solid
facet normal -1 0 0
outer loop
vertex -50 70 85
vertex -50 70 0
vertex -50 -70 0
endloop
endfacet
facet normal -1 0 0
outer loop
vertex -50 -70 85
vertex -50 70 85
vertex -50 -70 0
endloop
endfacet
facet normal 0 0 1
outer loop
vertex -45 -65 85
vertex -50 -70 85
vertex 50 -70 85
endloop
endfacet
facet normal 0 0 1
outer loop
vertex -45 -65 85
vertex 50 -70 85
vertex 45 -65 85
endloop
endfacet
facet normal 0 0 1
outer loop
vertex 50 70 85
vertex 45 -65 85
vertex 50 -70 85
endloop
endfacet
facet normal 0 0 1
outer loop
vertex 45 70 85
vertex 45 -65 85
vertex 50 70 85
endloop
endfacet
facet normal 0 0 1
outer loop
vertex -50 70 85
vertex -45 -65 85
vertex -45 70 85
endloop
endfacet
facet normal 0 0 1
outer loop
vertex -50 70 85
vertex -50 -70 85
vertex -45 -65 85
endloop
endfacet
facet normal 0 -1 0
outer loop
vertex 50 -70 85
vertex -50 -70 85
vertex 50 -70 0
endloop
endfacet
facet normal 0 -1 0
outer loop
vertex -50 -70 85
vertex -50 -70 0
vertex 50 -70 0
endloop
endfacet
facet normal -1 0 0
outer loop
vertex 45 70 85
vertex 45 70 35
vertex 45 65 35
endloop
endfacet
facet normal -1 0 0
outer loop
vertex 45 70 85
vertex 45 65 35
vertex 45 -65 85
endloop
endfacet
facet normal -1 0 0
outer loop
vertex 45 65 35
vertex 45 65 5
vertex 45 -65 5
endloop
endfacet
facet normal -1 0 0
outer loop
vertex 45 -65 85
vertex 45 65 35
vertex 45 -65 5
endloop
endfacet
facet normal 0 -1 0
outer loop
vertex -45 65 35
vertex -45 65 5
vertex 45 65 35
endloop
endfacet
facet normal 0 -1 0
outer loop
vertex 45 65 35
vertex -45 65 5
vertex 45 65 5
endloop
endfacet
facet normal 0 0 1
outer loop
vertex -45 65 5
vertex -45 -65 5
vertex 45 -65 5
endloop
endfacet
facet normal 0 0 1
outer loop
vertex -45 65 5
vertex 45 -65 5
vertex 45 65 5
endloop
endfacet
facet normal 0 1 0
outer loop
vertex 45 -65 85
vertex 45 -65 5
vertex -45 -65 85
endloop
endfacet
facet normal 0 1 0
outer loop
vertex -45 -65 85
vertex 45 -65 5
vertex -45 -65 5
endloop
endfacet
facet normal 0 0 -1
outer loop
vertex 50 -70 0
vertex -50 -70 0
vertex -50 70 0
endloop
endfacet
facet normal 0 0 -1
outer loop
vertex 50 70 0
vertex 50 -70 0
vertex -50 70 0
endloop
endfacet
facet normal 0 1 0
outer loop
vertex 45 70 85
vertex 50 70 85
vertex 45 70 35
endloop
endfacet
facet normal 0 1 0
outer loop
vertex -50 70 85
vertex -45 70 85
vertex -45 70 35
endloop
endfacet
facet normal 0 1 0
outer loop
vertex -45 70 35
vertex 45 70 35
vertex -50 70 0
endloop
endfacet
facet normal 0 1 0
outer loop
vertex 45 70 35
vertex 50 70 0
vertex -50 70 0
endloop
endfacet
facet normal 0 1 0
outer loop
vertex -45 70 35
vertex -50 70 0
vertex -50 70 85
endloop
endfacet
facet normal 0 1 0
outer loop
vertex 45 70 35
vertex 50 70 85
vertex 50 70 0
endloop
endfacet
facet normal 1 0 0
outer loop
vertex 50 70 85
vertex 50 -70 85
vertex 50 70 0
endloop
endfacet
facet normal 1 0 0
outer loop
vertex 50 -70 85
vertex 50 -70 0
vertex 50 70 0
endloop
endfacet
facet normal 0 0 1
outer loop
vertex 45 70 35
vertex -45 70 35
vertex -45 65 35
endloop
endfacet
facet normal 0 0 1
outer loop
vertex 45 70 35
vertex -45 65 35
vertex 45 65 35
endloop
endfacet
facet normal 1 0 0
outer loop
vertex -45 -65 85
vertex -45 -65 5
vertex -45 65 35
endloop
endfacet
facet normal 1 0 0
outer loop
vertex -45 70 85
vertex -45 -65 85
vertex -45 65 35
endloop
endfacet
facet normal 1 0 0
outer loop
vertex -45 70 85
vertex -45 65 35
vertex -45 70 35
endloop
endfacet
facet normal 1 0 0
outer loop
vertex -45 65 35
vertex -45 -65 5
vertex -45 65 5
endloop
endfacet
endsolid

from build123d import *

# Parameters (mm, degrees)
SKETCH2_W           = 140
SKETCH2_H           = 100
BOSS_EXTRUDE1_DEPTH = 5
SKETCH3_W           = 100
SKETCH3_H           = 140
SKETCH3_W_2         = 90
SKETCH3_H_2         = 130
BOSS_EXTRUDE2_DEPTH = 30
BOSS_EXTRUDE3_START = 35
BOSS_EXTRUDE3_DEPTH = 50


with BuildPart() as part:
    # Sketch2 → Boss-Extrude1 (new body)
    with BuildSketch(Plane(origin=(0, 0, 0), x_dir=(0, 1, 0), z_dir=(0, 0, 1))):
        Rectangle(SKETCH2_W, SKETCH2_H)
    extrude(amount=BOSS_EXTRUDE1_DEPTH)

    # Sketch3 → Boss-Extrude2 (add)
    with BuildSketch(Plane.XY.offset(5)):
        Rectangle(SKETCH3_W, SKETCH3_H)
        Rectangle(SKETCH3_W_2, SKETCH3_H_2, mode=Mode.SUBTRACT)
    extrude(amount=BOSS_EXTRUDE2_DEPTH)

    # Sketch4 → Boss-Extrude3 (add)
    with BuildSketch(Plane(origin=(0, 0, 0), x_dir=(0, 1, 0), z_dir=(0, 0, 1)).offset(BOSS_EXTRUDE3_START)):
        Polygon((70, 50), (-70, 50), (-70, -50), (70, -50), (70, -45), (-65, -45), (-65, 45), (70, 45), align=None)
    extrude(amount=BOSS_EXTRUDE3_DEPTH)


solid = part.part
